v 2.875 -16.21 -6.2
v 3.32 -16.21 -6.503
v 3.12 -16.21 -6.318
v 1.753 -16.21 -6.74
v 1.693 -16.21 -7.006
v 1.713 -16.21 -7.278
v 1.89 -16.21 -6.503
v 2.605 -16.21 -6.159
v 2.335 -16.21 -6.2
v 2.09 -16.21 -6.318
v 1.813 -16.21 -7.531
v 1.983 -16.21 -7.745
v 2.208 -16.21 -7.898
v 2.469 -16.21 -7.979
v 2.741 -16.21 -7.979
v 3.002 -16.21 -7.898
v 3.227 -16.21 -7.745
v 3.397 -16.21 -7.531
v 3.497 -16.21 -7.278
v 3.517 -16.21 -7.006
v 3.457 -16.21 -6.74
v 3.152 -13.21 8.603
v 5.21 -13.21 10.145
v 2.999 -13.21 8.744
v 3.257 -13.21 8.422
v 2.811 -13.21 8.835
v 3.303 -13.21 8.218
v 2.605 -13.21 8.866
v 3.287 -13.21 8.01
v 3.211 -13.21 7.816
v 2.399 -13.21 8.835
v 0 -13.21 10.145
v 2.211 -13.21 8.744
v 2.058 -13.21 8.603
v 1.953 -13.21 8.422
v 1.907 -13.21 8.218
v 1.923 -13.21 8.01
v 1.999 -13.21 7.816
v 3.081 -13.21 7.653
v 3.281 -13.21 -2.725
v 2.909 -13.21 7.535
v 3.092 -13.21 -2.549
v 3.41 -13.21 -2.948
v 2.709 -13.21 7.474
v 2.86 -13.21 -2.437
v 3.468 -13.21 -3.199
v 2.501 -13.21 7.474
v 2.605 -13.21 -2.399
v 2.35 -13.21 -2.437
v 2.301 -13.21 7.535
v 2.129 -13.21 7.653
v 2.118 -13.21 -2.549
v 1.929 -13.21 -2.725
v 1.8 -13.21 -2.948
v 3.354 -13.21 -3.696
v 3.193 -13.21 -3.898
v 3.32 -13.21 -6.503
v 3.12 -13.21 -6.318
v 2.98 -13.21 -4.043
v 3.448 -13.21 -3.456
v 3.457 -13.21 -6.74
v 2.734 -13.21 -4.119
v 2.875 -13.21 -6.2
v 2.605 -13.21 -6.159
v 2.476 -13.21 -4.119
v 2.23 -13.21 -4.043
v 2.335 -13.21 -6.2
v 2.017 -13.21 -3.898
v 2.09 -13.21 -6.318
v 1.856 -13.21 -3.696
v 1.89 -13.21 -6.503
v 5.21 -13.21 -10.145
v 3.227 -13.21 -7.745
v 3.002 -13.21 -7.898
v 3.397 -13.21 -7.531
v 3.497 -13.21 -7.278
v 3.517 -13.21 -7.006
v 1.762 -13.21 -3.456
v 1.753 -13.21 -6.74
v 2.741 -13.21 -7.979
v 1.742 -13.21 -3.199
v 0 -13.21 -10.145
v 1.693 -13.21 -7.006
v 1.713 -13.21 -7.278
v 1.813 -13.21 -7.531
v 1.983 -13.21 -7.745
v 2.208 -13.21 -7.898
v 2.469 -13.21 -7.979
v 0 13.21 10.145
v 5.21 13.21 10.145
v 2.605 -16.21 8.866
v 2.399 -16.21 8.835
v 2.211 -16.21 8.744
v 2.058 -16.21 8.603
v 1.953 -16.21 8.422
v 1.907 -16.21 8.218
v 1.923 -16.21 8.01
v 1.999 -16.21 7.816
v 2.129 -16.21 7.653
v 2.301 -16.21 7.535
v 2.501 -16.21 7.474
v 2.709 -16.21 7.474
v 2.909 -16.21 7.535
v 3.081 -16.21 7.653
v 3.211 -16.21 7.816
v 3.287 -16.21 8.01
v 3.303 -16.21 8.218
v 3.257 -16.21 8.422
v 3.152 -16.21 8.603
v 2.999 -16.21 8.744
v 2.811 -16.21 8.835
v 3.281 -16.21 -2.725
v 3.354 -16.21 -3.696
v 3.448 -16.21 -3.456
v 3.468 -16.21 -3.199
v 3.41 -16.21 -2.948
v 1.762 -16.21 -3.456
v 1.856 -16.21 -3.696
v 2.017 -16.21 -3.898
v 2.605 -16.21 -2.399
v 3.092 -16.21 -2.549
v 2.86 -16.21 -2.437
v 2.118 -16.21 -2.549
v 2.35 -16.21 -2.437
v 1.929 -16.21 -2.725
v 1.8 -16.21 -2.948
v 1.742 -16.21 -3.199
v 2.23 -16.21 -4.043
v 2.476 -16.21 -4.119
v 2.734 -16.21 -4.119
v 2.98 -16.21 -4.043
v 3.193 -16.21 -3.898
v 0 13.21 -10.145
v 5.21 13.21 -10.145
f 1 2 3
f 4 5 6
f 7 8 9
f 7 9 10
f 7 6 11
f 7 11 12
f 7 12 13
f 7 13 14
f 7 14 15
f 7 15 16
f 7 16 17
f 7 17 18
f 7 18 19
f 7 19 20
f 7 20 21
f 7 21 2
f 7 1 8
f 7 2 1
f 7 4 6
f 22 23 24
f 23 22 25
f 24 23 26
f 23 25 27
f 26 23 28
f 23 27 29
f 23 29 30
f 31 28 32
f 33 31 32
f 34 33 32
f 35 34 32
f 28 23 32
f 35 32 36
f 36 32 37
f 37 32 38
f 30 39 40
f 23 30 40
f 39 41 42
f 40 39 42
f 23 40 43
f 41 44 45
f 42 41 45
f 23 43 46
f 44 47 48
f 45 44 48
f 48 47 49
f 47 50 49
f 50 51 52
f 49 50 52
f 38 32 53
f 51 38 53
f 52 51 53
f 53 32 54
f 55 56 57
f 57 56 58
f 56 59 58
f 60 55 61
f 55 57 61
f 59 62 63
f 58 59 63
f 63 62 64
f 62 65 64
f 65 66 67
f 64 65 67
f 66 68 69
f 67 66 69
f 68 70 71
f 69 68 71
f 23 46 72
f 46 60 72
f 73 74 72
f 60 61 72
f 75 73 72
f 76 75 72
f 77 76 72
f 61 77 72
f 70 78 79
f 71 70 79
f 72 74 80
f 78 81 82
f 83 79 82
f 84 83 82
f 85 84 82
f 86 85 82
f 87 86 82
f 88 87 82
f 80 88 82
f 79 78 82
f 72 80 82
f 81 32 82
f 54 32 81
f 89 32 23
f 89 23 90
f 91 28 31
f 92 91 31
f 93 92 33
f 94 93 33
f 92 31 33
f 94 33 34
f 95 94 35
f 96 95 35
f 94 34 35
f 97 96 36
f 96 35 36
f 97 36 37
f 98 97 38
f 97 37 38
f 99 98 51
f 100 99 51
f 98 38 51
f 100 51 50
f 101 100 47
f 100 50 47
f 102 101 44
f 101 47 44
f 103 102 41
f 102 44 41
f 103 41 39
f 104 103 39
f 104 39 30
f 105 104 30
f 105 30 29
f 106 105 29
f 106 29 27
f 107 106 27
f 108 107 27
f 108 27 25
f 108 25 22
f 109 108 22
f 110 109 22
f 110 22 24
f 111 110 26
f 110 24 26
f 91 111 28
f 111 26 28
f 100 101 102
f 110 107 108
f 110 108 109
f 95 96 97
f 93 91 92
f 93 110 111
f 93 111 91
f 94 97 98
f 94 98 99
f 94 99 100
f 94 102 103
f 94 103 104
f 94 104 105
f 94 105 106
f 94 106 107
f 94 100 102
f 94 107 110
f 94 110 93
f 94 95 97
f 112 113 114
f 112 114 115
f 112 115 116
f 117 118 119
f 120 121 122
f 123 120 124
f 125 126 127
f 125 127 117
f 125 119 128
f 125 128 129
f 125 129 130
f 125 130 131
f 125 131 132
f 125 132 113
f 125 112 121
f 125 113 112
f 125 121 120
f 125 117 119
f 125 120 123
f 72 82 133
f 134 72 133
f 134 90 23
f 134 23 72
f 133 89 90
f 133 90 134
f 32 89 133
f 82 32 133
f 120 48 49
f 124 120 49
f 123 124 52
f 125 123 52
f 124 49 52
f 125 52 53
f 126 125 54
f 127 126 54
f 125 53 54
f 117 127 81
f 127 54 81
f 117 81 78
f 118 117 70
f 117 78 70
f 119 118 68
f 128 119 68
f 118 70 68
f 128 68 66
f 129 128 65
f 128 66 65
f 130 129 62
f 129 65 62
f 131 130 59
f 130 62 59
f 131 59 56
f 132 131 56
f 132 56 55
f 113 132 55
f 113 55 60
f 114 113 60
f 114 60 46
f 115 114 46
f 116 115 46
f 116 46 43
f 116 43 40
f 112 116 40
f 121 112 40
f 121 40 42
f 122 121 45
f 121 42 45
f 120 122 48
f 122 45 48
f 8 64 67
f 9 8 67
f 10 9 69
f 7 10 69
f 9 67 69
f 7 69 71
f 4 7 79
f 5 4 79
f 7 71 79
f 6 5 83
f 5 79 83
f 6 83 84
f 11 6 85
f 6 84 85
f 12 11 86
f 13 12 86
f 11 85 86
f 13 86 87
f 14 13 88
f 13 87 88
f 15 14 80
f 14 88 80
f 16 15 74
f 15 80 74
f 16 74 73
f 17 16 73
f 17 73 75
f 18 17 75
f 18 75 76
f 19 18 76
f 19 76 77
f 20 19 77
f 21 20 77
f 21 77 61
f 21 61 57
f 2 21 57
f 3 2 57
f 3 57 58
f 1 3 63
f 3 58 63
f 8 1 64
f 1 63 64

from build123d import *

# Parameters (mm, degrees)
SKETCH1_W           = 20.29
SKETCH1_H           = 26.42
BOSS_EXTRUDE1_DEPTH = 5.21
SKETCH2_R           = 0.915
SKETCH2_R_2         = 0.865
SKETCH2_R_3         = 0.7
BOSS_EXTRUDE2_DEPTH = 3


with BuildPart() as part:
    # Sketch1 → Boss-Extrude1 (new body)
    with BuildSketch(Plane(origin=(0, 0, 0), x_dir=(0, 0, -1), z_dir=(1, 0, 0))):
        Rectangle(SKETCH1_W, SKETCH1_H)
    extrude(amount=BOSS_EXTRUDE1_DEPTH)

    # Sketch2 → Boss-Extrude2 (add)
    with BuildSketch(Plane.XZ.offset(13.21)):
        with Locations(Location((2.605, -7.073929595, 0), (0, 0, 90))):
            Circle(SKETCH2_R)
        with Locations(Location((2.605, -3.263929595, 0), (0, 0, 90))):
            Circle(SKETCH2_R_2)
        with Locations(Location((2.605, 8.166070405, 0), (0, 0, 90))):
            Circle(SKETCH2_R_3)
    extrude(amount=BOSS_EXTRUDE2_DEPTH)


solid = part.part
